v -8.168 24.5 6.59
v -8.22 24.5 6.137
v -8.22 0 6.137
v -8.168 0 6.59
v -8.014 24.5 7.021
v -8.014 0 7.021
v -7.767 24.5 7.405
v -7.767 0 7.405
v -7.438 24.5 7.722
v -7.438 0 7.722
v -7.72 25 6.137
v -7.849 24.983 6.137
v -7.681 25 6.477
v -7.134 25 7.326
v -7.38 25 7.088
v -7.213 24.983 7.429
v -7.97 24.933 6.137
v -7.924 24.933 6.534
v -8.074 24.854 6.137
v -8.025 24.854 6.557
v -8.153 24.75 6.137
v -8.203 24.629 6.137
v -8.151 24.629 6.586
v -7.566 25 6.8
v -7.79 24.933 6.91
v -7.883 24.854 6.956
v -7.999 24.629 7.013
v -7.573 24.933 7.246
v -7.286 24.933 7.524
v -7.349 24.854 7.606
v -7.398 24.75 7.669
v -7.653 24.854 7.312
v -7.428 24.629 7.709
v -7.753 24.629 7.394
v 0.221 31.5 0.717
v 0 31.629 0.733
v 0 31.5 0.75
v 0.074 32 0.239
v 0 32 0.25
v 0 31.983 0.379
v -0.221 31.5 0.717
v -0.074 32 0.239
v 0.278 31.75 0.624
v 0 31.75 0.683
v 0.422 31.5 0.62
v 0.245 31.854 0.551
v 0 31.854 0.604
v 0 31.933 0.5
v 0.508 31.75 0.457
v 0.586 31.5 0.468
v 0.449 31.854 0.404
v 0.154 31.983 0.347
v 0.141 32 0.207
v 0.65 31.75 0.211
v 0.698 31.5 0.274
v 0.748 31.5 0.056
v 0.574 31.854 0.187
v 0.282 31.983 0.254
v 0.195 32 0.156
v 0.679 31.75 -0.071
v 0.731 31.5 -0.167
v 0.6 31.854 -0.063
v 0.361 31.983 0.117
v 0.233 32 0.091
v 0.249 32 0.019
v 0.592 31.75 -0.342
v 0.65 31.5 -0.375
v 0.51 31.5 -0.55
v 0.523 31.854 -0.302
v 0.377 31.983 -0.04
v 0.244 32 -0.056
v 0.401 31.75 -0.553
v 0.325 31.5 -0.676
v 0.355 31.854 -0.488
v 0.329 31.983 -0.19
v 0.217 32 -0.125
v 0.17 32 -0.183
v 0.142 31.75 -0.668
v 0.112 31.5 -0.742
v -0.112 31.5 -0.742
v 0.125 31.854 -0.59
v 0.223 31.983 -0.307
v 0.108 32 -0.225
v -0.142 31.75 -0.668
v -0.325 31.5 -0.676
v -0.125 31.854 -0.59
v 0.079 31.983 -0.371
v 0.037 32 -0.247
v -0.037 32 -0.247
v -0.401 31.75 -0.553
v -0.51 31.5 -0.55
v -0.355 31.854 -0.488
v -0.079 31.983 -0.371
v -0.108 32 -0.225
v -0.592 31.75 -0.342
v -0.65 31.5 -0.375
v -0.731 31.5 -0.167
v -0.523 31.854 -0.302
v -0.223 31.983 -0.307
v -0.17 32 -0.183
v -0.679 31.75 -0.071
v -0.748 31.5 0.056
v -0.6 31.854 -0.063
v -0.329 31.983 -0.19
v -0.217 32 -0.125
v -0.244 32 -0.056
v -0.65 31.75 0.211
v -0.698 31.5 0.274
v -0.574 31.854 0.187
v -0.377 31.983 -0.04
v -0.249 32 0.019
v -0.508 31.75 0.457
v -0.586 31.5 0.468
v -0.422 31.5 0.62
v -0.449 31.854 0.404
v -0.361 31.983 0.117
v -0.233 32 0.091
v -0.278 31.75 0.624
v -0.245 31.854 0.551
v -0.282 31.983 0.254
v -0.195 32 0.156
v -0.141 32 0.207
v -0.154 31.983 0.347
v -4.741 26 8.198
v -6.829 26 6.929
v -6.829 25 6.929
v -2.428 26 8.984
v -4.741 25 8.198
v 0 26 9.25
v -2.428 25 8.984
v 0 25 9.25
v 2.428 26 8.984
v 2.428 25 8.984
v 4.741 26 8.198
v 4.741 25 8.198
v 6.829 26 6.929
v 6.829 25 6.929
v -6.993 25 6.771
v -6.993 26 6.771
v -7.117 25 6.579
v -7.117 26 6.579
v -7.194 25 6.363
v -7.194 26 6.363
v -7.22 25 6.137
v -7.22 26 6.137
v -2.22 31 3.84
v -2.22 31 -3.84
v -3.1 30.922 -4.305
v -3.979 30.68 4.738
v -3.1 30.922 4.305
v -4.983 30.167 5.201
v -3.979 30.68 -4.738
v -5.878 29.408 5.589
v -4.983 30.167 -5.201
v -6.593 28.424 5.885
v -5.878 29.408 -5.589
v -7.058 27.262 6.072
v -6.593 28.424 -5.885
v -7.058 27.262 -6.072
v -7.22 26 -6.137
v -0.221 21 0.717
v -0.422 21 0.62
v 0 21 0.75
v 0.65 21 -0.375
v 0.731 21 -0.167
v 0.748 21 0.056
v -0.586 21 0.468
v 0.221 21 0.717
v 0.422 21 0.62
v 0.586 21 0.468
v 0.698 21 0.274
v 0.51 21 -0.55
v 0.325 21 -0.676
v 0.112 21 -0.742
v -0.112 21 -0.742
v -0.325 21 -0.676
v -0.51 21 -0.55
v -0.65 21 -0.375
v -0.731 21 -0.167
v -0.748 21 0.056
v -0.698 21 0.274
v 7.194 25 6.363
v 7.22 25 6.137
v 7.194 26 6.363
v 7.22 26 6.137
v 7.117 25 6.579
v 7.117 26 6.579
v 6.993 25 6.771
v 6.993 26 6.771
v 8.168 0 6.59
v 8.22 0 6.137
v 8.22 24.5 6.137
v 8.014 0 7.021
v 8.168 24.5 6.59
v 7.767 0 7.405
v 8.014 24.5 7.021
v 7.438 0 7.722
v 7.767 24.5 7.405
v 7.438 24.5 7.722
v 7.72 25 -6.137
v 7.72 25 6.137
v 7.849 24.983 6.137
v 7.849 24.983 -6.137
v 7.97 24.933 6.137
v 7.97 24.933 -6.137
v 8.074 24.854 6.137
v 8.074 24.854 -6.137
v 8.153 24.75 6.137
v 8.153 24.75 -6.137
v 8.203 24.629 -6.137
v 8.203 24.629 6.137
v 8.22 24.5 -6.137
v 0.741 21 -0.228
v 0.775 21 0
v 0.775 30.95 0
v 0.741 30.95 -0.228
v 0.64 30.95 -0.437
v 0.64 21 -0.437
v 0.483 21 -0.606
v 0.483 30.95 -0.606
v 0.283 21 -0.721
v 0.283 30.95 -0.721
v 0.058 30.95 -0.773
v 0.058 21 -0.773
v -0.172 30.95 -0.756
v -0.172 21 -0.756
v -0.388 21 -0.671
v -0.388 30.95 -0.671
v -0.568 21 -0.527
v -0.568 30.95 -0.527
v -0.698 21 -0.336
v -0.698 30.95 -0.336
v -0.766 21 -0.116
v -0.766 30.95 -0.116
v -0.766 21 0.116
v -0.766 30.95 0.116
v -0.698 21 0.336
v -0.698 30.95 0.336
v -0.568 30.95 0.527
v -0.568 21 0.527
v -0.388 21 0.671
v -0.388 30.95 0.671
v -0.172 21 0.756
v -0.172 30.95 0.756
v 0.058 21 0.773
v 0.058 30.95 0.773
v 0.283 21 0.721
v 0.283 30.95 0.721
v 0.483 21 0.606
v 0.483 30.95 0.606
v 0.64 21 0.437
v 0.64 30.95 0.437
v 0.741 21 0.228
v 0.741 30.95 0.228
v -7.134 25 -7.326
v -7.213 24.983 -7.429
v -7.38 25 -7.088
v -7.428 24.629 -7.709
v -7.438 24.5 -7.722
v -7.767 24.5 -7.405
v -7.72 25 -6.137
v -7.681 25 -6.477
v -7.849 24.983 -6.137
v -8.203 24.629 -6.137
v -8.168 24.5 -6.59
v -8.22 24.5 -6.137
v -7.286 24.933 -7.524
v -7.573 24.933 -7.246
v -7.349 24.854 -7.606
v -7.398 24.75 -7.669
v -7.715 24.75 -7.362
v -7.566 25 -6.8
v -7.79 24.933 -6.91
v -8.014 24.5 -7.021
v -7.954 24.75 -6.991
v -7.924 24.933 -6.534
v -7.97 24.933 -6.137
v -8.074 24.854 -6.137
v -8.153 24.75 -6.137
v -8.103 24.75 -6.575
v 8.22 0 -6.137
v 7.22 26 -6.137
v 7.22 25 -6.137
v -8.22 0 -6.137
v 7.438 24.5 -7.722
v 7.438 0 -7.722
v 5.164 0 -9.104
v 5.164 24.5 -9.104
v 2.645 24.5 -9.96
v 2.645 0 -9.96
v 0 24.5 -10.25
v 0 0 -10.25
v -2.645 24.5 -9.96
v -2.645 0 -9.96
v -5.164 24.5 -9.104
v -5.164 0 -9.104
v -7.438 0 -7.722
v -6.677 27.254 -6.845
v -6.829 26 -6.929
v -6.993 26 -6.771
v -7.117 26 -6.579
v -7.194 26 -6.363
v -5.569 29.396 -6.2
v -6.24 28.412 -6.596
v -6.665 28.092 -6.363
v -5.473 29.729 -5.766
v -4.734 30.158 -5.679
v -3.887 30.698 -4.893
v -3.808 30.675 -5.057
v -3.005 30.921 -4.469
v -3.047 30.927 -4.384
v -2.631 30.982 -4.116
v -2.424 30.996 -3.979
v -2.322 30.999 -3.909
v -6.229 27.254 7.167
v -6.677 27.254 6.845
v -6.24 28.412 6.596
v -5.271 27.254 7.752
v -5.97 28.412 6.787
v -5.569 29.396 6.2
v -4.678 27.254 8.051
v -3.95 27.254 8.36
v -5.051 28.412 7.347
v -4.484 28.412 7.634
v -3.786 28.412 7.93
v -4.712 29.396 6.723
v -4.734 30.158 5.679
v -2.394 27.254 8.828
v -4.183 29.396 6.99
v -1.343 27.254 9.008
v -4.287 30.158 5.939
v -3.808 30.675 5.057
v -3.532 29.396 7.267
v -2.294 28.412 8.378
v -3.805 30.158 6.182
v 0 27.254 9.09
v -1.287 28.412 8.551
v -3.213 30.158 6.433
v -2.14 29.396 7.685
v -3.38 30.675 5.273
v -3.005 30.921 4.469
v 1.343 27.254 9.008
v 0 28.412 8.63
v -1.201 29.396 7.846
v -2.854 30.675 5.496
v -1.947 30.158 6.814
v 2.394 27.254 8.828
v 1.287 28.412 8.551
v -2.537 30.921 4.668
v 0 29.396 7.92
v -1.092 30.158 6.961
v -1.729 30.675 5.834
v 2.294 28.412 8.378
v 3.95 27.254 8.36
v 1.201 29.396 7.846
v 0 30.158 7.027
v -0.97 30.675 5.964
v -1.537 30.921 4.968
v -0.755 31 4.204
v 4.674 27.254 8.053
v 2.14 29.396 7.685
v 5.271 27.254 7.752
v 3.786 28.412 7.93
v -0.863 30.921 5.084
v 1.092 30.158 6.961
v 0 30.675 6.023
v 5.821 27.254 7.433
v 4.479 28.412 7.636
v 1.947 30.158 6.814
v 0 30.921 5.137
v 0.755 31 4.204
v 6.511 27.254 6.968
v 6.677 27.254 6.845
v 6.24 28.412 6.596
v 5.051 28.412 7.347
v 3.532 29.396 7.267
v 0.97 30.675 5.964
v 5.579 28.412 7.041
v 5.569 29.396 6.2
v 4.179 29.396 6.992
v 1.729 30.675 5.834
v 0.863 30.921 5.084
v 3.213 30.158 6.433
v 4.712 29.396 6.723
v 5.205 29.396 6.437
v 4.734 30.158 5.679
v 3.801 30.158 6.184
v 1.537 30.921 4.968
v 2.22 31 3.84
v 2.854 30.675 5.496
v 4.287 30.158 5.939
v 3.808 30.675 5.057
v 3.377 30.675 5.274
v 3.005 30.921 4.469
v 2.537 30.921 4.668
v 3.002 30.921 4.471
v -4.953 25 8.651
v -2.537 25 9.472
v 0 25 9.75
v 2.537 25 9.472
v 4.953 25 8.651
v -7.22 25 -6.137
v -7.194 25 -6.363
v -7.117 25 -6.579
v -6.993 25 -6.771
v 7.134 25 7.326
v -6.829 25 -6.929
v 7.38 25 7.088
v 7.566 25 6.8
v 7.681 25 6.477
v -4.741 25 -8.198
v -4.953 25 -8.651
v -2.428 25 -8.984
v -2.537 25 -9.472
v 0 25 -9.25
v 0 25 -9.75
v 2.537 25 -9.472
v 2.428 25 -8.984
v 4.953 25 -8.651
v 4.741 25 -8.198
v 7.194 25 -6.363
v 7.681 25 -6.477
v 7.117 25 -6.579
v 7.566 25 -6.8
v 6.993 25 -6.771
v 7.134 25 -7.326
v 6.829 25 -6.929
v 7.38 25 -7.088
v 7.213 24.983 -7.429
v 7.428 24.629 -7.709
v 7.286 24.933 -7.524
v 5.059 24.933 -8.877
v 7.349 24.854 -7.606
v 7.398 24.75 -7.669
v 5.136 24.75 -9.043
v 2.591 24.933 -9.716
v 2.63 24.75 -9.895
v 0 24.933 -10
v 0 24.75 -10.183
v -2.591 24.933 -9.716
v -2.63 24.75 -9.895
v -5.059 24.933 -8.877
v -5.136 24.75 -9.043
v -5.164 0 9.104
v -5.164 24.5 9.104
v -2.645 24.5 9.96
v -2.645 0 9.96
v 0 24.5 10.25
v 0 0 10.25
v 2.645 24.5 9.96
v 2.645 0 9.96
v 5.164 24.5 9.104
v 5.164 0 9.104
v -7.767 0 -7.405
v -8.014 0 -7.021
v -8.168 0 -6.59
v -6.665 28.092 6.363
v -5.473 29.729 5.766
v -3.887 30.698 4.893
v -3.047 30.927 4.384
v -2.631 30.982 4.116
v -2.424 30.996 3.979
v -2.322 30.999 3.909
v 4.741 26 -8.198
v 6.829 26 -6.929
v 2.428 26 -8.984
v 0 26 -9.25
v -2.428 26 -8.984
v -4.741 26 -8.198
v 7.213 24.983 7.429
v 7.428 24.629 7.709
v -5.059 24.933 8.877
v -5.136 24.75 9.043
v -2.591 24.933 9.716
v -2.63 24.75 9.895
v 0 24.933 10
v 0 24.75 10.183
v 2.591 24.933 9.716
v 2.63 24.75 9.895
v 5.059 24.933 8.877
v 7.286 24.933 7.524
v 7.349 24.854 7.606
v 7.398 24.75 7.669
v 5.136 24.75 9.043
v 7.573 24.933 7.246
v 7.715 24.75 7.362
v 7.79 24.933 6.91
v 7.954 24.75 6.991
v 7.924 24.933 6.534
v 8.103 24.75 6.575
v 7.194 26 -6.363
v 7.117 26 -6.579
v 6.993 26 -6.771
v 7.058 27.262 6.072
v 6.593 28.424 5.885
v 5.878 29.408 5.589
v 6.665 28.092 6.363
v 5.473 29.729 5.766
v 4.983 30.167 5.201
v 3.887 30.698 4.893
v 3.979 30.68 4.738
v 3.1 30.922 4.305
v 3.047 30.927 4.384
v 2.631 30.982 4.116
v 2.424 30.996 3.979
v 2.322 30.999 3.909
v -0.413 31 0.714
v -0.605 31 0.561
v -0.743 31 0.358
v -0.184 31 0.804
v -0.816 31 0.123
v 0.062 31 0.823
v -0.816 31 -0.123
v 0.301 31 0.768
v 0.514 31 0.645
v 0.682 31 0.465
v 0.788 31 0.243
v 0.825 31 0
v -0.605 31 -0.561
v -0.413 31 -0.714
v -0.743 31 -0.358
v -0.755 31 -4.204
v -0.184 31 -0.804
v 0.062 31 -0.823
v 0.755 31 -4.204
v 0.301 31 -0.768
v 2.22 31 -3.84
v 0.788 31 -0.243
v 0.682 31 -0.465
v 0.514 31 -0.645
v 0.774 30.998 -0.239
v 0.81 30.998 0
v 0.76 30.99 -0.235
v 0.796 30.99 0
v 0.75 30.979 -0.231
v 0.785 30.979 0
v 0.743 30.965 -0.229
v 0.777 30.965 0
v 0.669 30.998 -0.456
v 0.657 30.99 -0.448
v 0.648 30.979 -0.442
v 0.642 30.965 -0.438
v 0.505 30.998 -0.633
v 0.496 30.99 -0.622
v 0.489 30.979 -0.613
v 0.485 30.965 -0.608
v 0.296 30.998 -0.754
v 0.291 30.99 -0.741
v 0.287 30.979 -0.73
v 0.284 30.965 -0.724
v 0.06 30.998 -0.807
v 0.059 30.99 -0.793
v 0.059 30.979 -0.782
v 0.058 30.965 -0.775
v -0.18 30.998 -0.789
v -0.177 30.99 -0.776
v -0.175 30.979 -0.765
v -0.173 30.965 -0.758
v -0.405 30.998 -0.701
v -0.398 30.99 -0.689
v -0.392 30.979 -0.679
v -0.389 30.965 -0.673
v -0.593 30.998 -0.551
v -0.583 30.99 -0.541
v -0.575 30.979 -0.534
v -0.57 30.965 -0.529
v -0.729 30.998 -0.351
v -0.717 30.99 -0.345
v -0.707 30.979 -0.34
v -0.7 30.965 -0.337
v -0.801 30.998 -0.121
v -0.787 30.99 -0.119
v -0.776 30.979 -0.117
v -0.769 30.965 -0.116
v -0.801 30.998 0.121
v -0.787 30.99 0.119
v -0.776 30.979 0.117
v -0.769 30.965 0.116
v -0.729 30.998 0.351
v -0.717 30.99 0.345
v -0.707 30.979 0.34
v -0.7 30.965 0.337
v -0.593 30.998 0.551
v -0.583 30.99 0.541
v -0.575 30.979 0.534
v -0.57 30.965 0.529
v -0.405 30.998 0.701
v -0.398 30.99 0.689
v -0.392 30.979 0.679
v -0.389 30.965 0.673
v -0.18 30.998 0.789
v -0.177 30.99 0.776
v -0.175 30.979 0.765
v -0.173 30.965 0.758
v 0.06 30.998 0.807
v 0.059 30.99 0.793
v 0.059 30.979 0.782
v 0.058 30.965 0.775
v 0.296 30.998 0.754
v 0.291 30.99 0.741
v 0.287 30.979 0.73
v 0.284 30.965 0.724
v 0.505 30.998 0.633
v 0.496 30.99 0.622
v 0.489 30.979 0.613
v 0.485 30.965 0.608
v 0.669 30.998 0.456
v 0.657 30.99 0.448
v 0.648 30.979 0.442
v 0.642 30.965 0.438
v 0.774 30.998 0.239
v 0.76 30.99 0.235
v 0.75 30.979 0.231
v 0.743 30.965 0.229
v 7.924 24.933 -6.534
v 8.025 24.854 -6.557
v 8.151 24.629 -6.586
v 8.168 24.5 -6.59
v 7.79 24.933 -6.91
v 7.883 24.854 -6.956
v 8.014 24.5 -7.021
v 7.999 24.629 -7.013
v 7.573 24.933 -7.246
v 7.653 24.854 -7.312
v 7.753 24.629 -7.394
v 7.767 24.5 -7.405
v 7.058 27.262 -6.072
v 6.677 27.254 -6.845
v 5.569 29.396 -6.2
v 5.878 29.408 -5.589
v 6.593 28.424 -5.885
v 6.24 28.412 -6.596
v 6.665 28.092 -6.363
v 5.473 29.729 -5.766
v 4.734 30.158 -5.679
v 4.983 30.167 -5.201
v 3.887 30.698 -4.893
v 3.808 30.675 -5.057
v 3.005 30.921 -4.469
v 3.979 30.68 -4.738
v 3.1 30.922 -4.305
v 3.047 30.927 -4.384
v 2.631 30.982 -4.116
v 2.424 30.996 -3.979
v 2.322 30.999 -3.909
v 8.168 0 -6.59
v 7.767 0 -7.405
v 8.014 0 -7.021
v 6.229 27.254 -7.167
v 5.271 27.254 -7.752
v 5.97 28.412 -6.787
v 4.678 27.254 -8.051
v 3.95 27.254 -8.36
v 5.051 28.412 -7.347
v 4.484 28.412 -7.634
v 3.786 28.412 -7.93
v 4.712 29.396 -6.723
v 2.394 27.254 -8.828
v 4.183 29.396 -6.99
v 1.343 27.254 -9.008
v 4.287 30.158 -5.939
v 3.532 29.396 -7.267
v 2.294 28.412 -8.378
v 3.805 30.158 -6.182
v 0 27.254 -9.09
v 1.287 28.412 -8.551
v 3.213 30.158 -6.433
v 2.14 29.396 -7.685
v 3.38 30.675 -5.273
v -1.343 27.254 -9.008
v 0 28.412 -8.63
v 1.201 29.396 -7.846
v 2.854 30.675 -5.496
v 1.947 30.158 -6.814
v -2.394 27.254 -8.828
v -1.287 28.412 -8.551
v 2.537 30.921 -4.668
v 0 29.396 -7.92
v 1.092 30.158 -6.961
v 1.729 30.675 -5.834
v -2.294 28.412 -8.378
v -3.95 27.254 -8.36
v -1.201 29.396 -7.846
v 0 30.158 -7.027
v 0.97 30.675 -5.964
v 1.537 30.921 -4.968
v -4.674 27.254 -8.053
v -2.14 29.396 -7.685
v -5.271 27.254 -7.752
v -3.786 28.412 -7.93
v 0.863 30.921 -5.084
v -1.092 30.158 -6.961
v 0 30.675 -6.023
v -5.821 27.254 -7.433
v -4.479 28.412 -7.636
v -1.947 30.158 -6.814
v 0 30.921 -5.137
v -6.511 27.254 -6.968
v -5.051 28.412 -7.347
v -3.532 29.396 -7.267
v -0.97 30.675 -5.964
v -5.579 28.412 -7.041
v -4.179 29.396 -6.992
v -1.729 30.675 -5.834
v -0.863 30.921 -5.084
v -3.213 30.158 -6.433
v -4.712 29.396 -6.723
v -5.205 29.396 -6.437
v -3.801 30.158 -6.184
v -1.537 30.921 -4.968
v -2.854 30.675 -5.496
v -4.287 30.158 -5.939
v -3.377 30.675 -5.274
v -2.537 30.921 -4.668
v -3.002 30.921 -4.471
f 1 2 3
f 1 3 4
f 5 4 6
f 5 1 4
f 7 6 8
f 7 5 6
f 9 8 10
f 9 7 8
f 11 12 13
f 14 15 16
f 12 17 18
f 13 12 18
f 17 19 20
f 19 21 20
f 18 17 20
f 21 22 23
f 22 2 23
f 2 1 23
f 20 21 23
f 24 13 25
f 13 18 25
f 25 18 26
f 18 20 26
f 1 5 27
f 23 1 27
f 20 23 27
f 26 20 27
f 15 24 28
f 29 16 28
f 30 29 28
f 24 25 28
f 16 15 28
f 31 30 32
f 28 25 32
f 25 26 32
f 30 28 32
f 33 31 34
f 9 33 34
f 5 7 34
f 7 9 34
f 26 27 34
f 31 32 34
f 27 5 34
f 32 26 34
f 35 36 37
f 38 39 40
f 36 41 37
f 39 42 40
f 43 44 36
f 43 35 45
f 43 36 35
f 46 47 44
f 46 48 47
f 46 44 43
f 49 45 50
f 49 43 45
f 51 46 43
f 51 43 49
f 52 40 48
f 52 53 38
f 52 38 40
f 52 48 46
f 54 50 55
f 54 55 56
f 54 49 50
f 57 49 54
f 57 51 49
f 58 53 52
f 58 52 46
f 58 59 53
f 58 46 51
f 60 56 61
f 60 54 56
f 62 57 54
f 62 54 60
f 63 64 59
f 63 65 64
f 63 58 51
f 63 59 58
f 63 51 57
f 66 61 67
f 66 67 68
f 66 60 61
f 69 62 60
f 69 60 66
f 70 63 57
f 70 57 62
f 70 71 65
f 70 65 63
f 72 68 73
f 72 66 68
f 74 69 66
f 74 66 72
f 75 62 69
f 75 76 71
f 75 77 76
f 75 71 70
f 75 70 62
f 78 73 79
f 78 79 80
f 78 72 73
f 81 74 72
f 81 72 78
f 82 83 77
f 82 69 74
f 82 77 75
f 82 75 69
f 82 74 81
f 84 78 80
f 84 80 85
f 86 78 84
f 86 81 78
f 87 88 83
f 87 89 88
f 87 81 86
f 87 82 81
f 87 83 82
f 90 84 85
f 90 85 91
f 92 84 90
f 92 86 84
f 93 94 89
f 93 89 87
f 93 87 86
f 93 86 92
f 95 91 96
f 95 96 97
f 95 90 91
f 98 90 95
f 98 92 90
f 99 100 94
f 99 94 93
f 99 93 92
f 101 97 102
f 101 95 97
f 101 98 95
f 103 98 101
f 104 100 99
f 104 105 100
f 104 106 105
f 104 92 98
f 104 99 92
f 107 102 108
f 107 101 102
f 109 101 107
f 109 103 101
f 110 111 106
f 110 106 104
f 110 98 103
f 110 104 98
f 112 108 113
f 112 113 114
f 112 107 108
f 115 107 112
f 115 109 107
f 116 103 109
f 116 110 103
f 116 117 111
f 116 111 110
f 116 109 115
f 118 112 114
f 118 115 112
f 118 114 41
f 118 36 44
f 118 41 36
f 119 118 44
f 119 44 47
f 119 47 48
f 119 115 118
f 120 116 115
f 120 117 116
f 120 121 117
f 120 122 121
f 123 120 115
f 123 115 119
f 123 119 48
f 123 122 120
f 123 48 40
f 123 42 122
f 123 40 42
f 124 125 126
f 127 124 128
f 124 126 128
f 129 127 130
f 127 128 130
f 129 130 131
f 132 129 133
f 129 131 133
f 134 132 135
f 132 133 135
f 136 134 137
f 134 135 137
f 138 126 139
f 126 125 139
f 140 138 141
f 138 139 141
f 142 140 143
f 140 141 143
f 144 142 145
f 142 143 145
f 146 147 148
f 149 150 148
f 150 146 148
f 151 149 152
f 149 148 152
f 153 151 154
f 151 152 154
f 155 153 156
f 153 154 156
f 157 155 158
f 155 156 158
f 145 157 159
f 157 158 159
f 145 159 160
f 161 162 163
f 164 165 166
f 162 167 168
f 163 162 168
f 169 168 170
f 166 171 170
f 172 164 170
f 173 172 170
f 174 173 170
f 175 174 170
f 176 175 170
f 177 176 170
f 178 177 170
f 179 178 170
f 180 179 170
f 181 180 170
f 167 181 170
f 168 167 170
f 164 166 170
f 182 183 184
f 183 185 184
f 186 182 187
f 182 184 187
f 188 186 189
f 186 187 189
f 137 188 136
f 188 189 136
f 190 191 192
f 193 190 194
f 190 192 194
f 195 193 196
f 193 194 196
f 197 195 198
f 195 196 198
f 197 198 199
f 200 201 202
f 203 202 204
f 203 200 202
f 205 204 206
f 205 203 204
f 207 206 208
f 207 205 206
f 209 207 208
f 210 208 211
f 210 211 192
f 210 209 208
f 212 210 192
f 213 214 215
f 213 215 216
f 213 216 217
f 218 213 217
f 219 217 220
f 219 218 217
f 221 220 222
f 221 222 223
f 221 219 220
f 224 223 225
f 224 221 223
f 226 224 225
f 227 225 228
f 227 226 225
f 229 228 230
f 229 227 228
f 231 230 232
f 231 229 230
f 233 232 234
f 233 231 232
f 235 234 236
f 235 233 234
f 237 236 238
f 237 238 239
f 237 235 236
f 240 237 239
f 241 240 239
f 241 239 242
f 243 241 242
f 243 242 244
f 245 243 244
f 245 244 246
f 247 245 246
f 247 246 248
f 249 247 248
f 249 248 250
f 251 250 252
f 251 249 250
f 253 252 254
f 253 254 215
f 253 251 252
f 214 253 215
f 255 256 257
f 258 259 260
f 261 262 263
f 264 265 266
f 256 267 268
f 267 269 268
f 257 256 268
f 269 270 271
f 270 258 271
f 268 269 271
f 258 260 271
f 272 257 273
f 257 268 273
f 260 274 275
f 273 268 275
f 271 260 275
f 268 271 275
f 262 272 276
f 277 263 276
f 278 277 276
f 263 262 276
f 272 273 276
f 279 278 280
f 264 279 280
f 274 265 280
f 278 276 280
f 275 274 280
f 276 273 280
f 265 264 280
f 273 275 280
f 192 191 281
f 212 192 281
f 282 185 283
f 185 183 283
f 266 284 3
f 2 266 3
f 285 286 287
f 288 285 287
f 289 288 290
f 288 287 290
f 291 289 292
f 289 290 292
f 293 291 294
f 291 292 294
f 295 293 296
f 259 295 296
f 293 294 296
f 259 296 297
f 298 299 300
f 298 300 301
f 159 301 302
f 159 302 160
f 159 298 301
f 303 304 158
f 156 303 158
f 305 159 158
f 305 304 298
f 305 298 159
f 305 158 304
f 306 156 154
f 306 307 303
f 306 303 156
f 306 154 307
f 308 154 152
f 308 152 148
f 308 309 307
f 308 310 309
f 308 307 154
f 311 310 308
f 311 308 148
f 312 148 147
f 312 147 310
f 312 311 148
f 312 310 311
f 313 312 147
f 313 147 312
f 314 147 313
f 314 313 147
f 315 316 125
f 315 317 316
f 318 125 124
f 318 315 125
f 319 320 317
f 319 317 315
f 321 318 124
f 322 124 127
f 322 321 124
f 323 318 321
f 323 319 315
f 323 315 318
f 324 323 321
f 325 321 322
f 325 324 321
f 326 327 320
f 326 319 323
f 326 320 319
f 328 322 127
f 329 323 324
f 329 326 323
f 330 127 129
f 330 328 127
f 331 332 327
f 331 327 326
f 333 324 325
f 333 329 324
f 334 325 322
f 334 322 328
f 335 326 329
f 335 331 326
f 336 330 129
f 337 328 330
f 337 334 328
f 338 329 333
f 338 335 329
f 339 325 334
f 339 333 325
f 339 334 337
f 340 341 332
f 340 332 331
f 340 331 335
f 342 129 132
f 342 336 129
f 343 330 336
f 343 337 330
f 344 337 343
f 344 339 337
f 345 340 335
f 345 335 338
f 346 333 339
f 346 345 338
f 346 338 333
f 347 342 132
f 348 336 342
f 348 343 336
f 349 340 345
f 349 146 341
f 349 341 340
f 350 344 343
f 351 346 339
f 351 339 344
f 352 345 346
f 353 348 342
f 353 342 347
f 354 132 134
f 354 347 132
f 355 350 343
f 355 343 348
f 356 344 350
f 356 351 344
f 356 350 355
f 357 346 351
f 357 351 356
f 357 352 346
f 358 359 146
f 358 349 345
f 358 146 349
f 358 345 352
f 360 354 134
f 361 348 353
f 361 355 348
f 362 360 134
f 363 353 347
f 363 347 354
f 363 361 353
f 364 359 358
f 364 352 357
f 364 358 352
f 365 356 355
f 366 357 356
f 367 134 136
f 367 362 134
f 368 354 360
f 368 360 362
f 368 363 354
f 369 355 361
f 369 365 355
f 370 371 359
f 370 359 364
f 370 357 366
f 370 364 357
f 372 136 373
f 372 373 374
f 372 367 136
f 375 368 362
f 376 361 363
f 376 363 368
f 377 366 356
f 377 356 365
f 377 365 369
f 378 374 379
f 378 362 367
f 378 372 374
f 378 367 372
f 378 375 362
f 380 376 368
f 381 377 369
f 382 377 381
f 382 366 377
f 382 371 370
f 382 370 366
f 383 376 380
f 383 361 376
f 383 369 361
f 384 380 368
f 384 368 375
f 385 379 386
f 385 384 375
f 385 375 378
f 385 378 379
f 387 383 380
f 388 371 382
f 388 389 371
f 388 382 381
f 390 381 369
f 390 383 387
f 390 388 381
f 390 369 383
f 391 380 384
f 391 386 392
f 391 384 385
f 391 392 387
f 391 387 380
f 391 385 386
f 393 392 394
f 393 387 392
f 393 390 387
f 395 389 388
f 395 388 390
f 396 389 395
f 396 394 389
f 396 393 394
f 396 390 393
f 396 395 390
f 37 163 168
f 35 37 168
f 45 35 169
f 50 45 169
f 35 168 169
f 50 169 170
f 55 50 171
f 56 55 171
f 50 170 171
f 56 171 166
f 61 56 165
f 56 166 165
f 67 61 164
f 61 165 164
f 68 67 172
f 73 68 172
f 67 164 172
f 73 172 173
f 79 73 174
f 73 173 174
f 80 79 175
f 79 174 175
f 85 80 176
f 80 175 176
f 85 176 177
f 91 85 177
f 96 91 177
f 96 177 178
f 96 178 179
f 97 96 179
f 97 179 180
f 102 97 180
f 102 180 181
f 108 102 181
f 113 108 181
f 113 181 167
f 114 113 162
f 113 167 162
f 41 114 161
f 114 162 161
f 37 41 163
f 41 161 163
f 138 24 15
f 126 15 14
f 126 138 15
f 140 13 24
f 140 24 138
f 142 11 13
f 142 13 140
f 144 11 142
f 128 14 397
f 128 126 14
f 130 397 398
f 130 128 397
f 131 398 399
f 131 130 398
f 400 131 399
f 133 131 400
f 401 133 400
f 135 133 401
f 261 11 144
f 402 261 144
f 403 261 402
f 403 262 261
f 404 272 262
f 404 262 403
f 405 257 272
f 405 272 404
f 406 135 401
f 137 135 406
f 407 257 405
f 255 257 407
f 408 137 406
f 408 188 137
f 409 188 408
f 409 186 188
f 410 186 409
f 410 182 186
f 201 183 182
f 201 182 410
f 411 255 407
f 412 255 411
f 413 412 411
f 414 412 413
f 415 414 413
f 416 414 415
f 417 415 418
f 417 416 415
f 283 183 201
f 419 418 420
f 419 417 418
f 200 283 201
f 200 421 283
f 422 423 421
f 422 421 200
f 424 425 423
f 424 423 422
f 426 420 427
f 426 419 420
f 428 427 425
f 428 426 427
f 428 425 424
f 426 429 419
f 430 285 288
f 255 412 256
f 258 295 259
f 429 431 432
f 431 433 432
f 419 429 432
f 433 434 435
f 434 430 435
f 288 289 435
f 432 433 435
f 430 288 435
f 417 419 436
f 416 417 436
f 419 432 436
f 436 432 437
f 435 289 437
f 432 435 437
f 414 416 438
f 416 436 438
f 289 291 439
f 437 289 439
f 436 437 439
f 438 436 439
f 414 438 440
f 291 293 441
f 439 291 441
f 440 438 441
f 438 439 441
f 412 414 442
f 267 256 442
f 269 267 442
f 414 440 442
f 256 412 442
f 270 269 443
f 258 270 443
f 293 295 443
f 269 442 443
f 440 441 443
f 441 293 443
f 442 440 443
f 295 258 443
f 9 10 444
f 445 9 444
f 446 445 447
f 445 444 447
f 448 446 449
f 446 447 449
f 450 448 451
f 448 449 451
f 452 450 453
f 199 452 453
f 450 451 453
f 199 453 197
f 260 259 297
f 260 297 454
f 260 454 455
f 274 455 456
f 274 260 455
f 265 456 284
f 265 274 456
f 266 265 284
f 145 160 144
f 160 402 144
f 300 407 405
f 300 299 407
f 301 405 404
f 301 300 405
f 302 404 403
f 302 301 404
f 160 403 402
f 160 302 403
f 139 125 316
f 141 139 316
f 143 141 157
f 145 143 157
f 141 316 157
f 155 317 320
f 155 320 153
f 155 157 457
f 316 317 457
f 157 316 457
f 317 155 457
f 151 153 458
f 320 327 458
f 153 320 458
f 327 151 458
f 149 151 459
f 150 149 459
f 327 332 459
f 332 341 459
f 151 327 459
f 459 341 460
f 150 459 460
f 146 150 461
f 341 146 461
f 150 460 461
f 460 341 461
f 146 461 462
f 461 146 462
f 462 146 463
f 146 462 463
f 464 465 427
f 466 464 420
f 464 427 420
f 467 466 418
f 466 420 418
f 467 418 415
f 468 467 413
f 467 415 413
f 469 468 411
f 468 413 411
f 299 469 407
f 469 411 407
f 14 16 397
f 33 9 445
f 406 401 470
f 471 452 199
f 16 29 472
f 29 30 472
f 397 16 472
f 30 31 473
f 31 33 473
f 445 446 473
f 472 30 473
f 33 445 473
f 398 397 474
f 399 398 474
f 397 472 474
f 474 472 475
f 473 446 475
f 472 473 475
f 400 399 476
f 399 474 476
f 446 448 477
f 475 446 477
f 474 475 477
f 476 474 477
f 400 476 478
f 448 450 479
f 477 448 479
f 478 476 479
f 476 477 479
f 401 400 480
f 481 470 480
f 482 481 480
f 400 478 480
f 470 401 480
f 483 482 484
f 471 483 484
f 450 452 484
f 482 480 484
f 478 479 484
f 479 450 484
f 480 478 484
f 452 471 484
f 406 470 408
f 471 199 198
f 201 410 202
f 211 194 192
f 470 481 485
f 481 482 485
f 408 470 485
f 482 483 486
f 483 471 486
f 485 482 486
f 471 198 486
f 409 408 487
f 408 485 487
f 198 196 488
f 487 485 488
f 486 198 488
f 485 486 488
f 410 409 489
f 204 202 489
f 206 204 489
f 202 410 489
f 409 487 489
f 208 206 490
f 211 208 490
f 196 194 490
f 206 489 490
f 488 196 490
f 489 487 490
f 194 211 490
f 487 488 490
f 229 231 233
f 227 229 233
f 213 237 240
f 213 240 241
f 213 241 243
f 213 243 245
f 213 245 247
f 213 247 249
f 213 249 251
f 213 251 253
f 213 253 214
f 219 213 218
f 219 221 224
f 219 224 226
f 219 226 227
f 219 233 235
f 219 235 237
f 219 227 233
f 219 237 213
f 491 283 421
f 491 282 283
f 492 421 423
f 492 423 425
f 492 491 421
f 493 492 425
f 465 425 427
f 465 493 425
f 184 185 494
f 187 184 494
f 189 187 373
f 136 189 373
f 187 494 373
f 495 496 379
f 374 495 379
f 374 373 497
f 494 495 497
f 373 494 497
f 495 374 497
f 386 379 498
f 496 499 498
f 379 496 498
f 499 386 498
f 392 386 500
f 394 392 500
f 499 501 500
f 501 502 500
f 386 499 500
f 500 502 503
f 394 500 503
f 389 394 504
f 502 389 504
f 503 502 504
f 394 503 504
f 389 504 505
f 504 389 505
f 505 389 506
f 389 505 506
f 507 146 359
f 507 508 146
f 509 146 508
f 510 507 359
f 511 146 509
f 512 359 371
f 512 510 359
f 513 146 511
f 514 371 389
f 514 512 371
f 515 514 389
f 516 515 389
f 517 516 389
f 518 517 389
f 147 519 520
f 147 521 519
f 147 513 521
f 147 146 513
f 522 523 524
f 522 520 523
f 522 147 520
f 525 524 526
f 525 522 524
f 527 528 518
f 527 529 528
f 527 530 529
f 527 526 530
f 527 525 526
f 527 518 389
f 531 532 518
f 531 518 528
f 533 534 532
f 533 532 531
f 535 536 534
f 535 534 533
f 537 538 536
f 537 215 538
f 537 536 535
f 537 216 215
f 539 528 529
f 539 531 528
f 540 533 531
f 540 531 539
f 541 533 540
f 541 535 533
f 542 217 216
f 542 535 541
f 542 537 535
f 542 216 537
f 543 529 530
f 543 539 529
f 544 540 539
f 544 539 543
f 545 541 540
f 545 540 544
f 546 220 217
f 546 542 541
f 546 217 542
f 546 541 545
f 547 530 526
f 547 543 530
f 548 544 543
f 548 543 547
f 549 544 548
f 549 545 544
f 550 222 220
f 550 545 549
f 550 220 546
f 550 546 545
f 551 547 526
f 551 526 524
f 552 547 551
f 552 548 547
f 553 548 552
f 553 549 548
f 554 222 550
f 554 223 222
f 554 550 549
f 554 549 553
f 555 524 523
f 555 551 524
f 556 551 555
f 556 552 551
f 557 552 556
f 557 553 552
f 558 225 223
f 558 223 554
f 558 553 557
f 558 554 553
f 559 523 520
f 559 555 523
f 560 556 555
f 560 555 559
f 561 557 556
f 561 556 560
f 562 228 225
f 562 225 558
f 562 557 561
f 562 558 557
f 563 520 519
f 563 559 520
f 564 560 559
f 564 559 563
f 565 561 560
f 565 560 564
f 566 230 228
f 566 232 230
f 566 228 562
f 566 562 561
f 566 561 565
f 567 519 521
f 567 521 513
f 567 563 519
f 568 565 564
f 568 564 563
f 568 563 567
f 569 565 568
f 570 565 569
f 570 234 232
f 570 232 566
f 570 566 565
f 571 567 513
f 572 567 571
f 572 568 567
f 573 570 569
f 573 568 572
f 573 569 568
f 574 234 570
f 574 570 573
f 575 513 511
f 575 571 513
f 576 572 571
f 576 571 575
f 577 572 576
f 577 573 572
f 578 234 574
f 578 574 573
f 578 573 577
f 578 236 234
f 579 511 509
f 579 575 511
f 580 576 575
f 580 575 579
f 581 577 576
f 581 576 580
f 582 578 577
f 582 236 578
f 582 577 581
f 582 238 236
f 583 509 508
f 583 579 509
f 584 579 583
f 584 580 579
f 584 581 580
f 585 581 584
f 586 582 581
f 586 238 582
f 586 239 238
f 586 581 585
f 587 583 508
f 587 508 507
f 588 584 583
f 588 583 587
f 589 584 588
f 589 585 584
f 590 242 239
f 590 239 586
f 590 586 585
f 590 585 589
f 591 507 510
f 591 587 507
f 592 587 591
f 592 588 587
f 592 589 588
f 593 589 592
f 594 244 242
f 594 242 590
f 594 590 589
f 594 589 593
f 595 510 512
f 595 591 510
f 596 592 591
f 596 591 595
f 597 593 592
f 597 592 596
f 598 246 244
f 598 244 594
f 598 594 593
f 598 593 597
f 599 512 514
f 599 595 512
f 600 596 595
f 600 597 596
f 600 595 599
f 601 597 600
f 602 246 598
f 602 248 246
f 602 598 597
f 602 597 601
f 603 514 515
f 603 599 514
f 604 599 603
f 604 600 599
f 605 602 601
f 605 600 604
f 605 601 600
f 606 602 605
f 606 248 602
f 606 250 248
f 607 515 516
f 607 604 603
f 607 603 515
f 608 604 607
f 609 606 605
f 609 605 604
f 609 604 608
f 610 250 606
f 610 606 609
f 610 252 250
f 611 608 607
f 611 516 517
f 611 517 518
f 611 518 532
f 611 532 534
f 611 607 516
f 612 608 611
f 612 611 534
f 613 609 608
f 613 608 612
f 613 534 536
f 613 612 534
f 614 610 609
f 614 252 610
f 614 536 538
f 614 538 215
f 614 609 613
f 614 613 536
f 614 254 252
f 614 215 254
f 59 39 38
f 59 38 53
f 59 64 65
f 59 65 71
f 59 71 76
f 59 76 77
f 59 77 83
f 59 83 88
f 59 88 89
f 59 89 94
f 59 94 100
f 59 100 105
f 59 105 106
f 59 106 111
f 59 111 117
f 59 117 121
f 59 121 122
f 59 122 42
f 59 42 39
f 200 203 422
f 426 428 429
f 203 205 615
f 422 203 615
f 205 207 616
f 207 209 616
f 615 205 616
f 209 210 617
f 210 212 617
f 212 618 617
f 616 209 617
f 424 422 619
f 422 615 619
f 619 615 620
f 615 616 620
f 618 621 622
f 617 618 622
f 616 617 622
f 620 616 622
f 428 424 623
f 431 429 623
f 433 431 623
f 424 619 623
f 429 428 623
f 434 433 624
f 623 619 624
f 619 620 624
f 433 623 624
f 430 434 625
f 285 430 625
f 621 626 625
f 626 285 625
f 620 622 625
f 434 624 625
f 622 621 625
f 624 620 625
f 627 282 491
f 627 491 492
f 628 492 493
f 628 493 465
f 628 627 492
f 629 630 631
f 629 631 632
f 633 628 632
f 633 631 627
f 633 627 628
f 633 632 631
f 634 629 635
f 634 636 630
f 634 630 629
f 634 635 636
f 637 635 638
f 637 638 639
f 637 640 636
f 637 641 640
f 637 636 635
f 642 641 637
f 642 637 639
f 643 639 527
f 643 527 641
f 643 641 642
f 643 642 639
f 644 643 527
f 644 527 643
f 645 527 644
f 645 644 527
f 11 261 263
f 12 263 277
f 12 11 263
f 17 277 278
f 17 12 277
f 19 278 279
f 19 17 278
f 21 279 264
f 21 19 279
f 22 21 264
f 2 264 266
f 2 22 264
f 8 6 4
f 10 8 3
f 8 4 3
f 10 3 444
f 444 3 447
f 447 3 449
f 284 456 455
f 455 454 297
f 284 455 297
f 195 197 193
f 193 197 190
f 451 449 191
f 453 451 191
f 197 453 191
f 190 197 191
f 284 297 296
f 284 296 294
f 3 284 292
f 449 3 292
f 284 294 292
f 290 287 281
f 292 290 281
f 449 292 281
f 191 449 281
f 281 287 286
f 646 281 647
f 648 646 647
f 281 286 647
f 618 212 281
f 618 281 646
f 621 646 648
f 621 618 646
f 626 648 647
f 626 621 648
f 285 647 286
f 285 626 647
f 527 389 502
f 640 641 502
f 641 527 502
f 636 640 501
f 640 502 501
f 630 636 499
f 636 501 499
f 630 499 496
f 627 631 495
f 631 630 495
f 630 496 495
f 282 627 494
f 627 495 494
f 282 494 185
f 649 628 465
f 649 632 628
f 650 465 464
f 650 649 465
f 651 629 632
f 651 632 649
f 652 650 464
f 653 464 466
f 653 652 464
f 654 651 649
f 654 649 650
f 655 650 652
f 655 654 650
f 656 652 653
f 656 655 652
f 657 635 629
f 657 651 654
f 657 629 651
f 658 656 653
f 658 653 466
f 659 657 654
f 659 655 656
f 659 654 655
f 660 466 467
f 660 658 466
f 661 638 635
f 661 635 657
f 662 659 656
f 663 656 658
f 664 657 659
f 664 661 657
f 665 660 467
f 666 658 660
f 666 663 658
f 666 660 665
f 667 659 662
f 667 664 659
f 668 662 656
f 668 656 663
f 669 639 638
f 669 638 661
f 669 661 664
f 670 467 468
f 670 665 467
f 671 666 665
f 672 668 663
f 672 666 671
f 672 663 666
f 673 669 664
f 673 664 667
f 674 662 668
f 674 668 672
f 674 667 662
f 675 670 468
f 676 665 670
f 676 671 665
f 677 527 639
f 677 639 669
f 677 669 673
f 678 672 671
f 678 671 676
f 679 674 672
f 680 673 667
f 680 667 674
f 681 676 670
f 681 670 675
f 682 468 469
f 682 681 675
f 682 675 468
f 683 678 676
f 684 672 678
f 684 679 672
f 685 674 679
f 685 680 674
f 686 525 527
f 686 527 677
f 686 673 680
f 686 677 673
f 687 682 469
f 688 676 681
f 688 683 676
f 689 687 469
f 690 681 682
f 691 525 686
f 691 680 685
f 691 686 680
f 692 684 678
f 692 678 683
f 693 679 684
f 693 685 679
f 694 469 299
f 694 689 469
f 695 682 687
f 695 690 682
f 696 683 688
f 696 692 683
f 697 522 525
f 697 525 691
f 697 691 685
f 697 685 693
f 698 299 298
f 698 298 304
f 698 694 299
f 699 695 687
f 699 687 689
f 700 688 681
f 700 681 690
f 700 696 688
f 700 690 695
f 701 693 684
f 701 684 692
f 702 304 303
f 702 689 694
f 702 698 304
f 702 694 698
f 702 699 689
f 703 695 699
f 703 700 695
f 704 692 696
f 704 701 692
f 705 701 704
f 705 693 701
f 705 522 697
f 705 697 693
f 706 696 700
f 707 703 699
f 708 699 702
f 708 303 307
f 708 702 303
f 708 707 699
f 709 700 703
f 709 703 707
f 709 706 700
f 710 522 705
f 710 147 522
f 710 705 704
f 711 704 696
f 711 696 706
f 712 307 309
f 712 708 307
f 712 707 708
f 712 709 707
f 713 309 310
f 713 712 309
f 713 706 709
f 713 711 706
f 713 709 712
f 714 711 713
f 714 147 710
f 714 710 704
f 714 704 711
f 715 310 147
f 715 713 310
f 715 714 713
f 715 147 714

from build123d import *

# Parameters (mm, degrees)
BOSS_EXTRUDE1_DEPTH      = 25
SHELL1_T                 = -1
BOSS_EXTRUDE2_DEPTH      = 30
FILLET2_R                = 5
FILLET3_R                = 1
SKETCH3_R                = 0.75
CUT_EXTRUDE1_DEPTH       = 10
BOSS_EXTRUDE3_DEPTH      = 1
BOSS_EXTRUDE3_DEPTH_BACK = 10
SKETCH3_2_R              = 0.75
FILLET4_R                = 0.5
FILLET5_R                = 2
MOVE_START               = 21
MOVE_FACE1_OUTLINE_R     = 0.775
MOVE_FACE1_OUTLINE_R_2   = 0.75
MOVE_FACE1_DEPTH         = 10
FILLET6_R                = 0.05
FILLET7_R                = 0.5


# Read off the part's stored shape, not the designer's step: Move Face1
with BuildPart() as part:
    # Sketch1 → Boss-Extrude1 (new body)
    with BuildSketch(Plane(origin=(0, 0, 0), x_dir=(1, 0, 0), z_dir=(0, 1, 0))):
        with BuildLine():
            Line((8.22, -7.068411902), (8.22, 7.068411902))
            ThreePointArc((8.22, 7.068411902), (0, 10.25), (-8.22, 7.068411902))
            Line((-8.22, 7.068411902), (-8.22, -7.068411902))
            ThreePointArc((-8.22, -7.068411902), (0, -10.25), (8.22, -7.068411902))
        make_face()
    extrude(amount=BOSS_EXTRUDE1_DEPTH)

    # Shell1
    shell1_openings = [part.faces().sort_by_distance(p)[0] for p in [
        (0, 25, 0),
    ]]
    offset(amount=SHELL1_T, openings=shell1_openings, kind=Kind.INTERSECTION)

    # Sketch2 → Boss-Extrude2 (add)
    with BuildSketch(Plane(origin=(0, 1, 0), x_dir=(1, 0, 0), z_dir=(0, 1, 0))):
        with BuildLine():
            Line((7.22, -6.615127941), (7.22, 6.615127941))
            ThreePointArc((7.22, 6.615127941), (0, 9.25), (-7.22, 6.615127941))
            Line((-7.22, 6.615127941), (-7.22, -6.615127941))
            ThreePointArc((-7.22, -6.615127941), (0, -9.25), (7.22, -6.615127941))
        make_face()
    extrude(amount=BOSS_EXTRUDE2_DEPTH)

    # Fillet2
    # the kernel refuses this fillet: 5 mm, written as the material it takes off along each edge
    with BuildSketch(Plane(origin=(0, 31, -1.959453333), x_dir=(-0.9702500957932787, 0, -0.24210483599699856), z_dir=(0.24210483599699856, 0, -0.9702500957932787))) as fillet2_piece_1:
        with BuildLine():
            CenterArc((11.209453333 - FILLET2_R, -FILLET2_R), FILLET2_R, 0, 90)
            Line((11.209453333 - FILLET2_R, 0), (11.209453333, 0))
            Line((11.209453333, 0), (11.209453333, -FILLET2_R))
        make_face()
    revolve(axis=Axis((0, 31, -1.959453333), (0, 1, 0)), revolution_arc=208.0216057, mode=Mode.SUBTRACT)
    with BuildSketch(Plane(origin=(7.22, 31, 19.115127941), x_dir=(0, -1, 0), z_dir=(0, 0, -1)), Plane(origin=(-7.22, 31, -19.115127941), x_dir=(0, -1, 0), z_dir=(0, 0, 1))) as fillet2_piece_2:
        with BuildLine():
            CenterArc((FILLET2_R, FILLET2_R), FILLET2_R, 180, 90)
            Line((0, FILLET2_R), (0, 0))
            Line((0, 0), (FILLET2_R, 0))
        make_face()
    extrude(amount=38.230255882, mode=Mode.SUBTRACT)
    with BuildSketch(Plane(origin=(0, 31, 1.959453333), x_dir=(0.9702500957932789, 0, 0.24210483599699756), z_dir=(-0.24210483599699756, 0, 0.9702500957932789))) as fillet2_piece_3:
        with BuildLine():
            CenterArc((11.209453333 - FILLET2_R, -FILLET2_R), FILLET2_R, 0, 90)
            Line((11.209453333 - FILLET2_R, 0), (11.209453333, 0))
            Line((11.209453333, 0), (11.209453333, -FILLET2_R))
        make_face()
    revolve(axis=Axis((0, 31, 1.959453333), (0, 1, 0)), revolution_arc=208.0216057, mode=Mode.SUBTRACT)

    # Fillet3
    fillet3_edges = [part.edges().sort_by_distance(p)[0] for p in [
        (-7.22, 25.5, 6.615127941),
        (-7.22, 25.5, -6.615127941),
        (7.22, 25.5, -6.615127941),
        (7.22, 25.5, 6.615127941),
        (5.607218199, 29.677873424, -5.828692054),
        (5.607218199, 29.677873424, 5.828692054),
        (-5.607218199, 29.677873424, -5.828692054),
        (-5.607218199, 29.677873424, 5.828692054),
    ]]
    fillet(fillet3_edges, radius=FILLET3_R)

    # Sketch3 → Cut-Extrude1 (cut)
    with BuildSketch(Plane(origin=(0, 31, 0), x_dir=(1, 0, 0), z_dir=(0, 1, 0))):
        with Locations(Location((0, 0, 0), (0, 0, 270))):
            Circle(SKETCH3_R)
    extrude(amount=-CUT_EXTRUDE1_DEPTH, mode=Mode.SUBTRACT)

    # Fillet5
    fillet5_edges = [part.edges().sort_by_distance(p)[0] for p in [
        (-8.22, 12.5, 7.068411902),
        (-8.22, 12.5, -7.068411902),
        (8.22, 12.5, -7.068411902),
        (8.22, 12.5, 7.068411902),
    ]]
    fillet(fillet5_edges, radius=FILLET5_R)

    # Move Face1 outline → Move Face1 (cut)
    with BuildSketch(Plane(origin=(0, 0, 0), x_dir=(1, 0, 0), z_dir=(0, 1, 0)).offset(MOVE_START)):
        Circle(MOVE_FACE1_OUTLINE_R)
        Circle(MOVE_FACE1_OUTLINE_R_2, mode=Mode.SUBTRACT)
    extrude(amount=MOVE_FACE1_DEPTH, mode=Mode.SUBTRACT)

    # Fillet6
    fillet6_edges = [part.edges().sort_by_distance(p)[0] for p in [
        (-0.775, 31, 0),
    ]]
    fillet(fillet6_edges, radius=FILLET6_R)

    # Fillet7
    fillet7_edges = [part.edges().sort_by_distance(p)[0] for p in [
        (0, 25, -10.25),
        (0, 25, 10.25),
        (8.22, 25, 0),
        (8.014011862, 25, 7.020541767),
        (8.014011862, 25, -7.020541767),
        (-8.014011862, 25, 7.020541767),
        (-8.014011862, 25, -7.020541767),
        (-8.22, 25, 0),
    ]]
    fillet(fillet7_edges, radius=FILLET7_R)


with BuildPart() as body_2:
    # Sketch3<2> → Boss-Extrude3 (new, two sides: drawn at the far end of the back side and taken through both)
    with BuildSketch(Plane(origin=(0, 31, 0), x_dir=(1, 0, 0), z_dir=(0, 1, 0)).offset(-BOSS_EXTRUDE3_DEPTH_BACK)):
        with Locations(Location((0, 0, 0), (0, 0, 270))):
            Circle(SKETCH3_2_R)
    extrude(amount=BOSS_EXTRUDE3_DEPTH + BOSS_EXTRUDE3_DEPTH_BACK)

    # Fillet4
    fillet4_edges = [body_2.edges().sort_by_distance(p)[0] for p in [
        (0, 32, -0.75),
    ]]
    fillet(fillet4_edges, radius=FILLET4_R)


solid = Compound([part.part, body_2.part])
